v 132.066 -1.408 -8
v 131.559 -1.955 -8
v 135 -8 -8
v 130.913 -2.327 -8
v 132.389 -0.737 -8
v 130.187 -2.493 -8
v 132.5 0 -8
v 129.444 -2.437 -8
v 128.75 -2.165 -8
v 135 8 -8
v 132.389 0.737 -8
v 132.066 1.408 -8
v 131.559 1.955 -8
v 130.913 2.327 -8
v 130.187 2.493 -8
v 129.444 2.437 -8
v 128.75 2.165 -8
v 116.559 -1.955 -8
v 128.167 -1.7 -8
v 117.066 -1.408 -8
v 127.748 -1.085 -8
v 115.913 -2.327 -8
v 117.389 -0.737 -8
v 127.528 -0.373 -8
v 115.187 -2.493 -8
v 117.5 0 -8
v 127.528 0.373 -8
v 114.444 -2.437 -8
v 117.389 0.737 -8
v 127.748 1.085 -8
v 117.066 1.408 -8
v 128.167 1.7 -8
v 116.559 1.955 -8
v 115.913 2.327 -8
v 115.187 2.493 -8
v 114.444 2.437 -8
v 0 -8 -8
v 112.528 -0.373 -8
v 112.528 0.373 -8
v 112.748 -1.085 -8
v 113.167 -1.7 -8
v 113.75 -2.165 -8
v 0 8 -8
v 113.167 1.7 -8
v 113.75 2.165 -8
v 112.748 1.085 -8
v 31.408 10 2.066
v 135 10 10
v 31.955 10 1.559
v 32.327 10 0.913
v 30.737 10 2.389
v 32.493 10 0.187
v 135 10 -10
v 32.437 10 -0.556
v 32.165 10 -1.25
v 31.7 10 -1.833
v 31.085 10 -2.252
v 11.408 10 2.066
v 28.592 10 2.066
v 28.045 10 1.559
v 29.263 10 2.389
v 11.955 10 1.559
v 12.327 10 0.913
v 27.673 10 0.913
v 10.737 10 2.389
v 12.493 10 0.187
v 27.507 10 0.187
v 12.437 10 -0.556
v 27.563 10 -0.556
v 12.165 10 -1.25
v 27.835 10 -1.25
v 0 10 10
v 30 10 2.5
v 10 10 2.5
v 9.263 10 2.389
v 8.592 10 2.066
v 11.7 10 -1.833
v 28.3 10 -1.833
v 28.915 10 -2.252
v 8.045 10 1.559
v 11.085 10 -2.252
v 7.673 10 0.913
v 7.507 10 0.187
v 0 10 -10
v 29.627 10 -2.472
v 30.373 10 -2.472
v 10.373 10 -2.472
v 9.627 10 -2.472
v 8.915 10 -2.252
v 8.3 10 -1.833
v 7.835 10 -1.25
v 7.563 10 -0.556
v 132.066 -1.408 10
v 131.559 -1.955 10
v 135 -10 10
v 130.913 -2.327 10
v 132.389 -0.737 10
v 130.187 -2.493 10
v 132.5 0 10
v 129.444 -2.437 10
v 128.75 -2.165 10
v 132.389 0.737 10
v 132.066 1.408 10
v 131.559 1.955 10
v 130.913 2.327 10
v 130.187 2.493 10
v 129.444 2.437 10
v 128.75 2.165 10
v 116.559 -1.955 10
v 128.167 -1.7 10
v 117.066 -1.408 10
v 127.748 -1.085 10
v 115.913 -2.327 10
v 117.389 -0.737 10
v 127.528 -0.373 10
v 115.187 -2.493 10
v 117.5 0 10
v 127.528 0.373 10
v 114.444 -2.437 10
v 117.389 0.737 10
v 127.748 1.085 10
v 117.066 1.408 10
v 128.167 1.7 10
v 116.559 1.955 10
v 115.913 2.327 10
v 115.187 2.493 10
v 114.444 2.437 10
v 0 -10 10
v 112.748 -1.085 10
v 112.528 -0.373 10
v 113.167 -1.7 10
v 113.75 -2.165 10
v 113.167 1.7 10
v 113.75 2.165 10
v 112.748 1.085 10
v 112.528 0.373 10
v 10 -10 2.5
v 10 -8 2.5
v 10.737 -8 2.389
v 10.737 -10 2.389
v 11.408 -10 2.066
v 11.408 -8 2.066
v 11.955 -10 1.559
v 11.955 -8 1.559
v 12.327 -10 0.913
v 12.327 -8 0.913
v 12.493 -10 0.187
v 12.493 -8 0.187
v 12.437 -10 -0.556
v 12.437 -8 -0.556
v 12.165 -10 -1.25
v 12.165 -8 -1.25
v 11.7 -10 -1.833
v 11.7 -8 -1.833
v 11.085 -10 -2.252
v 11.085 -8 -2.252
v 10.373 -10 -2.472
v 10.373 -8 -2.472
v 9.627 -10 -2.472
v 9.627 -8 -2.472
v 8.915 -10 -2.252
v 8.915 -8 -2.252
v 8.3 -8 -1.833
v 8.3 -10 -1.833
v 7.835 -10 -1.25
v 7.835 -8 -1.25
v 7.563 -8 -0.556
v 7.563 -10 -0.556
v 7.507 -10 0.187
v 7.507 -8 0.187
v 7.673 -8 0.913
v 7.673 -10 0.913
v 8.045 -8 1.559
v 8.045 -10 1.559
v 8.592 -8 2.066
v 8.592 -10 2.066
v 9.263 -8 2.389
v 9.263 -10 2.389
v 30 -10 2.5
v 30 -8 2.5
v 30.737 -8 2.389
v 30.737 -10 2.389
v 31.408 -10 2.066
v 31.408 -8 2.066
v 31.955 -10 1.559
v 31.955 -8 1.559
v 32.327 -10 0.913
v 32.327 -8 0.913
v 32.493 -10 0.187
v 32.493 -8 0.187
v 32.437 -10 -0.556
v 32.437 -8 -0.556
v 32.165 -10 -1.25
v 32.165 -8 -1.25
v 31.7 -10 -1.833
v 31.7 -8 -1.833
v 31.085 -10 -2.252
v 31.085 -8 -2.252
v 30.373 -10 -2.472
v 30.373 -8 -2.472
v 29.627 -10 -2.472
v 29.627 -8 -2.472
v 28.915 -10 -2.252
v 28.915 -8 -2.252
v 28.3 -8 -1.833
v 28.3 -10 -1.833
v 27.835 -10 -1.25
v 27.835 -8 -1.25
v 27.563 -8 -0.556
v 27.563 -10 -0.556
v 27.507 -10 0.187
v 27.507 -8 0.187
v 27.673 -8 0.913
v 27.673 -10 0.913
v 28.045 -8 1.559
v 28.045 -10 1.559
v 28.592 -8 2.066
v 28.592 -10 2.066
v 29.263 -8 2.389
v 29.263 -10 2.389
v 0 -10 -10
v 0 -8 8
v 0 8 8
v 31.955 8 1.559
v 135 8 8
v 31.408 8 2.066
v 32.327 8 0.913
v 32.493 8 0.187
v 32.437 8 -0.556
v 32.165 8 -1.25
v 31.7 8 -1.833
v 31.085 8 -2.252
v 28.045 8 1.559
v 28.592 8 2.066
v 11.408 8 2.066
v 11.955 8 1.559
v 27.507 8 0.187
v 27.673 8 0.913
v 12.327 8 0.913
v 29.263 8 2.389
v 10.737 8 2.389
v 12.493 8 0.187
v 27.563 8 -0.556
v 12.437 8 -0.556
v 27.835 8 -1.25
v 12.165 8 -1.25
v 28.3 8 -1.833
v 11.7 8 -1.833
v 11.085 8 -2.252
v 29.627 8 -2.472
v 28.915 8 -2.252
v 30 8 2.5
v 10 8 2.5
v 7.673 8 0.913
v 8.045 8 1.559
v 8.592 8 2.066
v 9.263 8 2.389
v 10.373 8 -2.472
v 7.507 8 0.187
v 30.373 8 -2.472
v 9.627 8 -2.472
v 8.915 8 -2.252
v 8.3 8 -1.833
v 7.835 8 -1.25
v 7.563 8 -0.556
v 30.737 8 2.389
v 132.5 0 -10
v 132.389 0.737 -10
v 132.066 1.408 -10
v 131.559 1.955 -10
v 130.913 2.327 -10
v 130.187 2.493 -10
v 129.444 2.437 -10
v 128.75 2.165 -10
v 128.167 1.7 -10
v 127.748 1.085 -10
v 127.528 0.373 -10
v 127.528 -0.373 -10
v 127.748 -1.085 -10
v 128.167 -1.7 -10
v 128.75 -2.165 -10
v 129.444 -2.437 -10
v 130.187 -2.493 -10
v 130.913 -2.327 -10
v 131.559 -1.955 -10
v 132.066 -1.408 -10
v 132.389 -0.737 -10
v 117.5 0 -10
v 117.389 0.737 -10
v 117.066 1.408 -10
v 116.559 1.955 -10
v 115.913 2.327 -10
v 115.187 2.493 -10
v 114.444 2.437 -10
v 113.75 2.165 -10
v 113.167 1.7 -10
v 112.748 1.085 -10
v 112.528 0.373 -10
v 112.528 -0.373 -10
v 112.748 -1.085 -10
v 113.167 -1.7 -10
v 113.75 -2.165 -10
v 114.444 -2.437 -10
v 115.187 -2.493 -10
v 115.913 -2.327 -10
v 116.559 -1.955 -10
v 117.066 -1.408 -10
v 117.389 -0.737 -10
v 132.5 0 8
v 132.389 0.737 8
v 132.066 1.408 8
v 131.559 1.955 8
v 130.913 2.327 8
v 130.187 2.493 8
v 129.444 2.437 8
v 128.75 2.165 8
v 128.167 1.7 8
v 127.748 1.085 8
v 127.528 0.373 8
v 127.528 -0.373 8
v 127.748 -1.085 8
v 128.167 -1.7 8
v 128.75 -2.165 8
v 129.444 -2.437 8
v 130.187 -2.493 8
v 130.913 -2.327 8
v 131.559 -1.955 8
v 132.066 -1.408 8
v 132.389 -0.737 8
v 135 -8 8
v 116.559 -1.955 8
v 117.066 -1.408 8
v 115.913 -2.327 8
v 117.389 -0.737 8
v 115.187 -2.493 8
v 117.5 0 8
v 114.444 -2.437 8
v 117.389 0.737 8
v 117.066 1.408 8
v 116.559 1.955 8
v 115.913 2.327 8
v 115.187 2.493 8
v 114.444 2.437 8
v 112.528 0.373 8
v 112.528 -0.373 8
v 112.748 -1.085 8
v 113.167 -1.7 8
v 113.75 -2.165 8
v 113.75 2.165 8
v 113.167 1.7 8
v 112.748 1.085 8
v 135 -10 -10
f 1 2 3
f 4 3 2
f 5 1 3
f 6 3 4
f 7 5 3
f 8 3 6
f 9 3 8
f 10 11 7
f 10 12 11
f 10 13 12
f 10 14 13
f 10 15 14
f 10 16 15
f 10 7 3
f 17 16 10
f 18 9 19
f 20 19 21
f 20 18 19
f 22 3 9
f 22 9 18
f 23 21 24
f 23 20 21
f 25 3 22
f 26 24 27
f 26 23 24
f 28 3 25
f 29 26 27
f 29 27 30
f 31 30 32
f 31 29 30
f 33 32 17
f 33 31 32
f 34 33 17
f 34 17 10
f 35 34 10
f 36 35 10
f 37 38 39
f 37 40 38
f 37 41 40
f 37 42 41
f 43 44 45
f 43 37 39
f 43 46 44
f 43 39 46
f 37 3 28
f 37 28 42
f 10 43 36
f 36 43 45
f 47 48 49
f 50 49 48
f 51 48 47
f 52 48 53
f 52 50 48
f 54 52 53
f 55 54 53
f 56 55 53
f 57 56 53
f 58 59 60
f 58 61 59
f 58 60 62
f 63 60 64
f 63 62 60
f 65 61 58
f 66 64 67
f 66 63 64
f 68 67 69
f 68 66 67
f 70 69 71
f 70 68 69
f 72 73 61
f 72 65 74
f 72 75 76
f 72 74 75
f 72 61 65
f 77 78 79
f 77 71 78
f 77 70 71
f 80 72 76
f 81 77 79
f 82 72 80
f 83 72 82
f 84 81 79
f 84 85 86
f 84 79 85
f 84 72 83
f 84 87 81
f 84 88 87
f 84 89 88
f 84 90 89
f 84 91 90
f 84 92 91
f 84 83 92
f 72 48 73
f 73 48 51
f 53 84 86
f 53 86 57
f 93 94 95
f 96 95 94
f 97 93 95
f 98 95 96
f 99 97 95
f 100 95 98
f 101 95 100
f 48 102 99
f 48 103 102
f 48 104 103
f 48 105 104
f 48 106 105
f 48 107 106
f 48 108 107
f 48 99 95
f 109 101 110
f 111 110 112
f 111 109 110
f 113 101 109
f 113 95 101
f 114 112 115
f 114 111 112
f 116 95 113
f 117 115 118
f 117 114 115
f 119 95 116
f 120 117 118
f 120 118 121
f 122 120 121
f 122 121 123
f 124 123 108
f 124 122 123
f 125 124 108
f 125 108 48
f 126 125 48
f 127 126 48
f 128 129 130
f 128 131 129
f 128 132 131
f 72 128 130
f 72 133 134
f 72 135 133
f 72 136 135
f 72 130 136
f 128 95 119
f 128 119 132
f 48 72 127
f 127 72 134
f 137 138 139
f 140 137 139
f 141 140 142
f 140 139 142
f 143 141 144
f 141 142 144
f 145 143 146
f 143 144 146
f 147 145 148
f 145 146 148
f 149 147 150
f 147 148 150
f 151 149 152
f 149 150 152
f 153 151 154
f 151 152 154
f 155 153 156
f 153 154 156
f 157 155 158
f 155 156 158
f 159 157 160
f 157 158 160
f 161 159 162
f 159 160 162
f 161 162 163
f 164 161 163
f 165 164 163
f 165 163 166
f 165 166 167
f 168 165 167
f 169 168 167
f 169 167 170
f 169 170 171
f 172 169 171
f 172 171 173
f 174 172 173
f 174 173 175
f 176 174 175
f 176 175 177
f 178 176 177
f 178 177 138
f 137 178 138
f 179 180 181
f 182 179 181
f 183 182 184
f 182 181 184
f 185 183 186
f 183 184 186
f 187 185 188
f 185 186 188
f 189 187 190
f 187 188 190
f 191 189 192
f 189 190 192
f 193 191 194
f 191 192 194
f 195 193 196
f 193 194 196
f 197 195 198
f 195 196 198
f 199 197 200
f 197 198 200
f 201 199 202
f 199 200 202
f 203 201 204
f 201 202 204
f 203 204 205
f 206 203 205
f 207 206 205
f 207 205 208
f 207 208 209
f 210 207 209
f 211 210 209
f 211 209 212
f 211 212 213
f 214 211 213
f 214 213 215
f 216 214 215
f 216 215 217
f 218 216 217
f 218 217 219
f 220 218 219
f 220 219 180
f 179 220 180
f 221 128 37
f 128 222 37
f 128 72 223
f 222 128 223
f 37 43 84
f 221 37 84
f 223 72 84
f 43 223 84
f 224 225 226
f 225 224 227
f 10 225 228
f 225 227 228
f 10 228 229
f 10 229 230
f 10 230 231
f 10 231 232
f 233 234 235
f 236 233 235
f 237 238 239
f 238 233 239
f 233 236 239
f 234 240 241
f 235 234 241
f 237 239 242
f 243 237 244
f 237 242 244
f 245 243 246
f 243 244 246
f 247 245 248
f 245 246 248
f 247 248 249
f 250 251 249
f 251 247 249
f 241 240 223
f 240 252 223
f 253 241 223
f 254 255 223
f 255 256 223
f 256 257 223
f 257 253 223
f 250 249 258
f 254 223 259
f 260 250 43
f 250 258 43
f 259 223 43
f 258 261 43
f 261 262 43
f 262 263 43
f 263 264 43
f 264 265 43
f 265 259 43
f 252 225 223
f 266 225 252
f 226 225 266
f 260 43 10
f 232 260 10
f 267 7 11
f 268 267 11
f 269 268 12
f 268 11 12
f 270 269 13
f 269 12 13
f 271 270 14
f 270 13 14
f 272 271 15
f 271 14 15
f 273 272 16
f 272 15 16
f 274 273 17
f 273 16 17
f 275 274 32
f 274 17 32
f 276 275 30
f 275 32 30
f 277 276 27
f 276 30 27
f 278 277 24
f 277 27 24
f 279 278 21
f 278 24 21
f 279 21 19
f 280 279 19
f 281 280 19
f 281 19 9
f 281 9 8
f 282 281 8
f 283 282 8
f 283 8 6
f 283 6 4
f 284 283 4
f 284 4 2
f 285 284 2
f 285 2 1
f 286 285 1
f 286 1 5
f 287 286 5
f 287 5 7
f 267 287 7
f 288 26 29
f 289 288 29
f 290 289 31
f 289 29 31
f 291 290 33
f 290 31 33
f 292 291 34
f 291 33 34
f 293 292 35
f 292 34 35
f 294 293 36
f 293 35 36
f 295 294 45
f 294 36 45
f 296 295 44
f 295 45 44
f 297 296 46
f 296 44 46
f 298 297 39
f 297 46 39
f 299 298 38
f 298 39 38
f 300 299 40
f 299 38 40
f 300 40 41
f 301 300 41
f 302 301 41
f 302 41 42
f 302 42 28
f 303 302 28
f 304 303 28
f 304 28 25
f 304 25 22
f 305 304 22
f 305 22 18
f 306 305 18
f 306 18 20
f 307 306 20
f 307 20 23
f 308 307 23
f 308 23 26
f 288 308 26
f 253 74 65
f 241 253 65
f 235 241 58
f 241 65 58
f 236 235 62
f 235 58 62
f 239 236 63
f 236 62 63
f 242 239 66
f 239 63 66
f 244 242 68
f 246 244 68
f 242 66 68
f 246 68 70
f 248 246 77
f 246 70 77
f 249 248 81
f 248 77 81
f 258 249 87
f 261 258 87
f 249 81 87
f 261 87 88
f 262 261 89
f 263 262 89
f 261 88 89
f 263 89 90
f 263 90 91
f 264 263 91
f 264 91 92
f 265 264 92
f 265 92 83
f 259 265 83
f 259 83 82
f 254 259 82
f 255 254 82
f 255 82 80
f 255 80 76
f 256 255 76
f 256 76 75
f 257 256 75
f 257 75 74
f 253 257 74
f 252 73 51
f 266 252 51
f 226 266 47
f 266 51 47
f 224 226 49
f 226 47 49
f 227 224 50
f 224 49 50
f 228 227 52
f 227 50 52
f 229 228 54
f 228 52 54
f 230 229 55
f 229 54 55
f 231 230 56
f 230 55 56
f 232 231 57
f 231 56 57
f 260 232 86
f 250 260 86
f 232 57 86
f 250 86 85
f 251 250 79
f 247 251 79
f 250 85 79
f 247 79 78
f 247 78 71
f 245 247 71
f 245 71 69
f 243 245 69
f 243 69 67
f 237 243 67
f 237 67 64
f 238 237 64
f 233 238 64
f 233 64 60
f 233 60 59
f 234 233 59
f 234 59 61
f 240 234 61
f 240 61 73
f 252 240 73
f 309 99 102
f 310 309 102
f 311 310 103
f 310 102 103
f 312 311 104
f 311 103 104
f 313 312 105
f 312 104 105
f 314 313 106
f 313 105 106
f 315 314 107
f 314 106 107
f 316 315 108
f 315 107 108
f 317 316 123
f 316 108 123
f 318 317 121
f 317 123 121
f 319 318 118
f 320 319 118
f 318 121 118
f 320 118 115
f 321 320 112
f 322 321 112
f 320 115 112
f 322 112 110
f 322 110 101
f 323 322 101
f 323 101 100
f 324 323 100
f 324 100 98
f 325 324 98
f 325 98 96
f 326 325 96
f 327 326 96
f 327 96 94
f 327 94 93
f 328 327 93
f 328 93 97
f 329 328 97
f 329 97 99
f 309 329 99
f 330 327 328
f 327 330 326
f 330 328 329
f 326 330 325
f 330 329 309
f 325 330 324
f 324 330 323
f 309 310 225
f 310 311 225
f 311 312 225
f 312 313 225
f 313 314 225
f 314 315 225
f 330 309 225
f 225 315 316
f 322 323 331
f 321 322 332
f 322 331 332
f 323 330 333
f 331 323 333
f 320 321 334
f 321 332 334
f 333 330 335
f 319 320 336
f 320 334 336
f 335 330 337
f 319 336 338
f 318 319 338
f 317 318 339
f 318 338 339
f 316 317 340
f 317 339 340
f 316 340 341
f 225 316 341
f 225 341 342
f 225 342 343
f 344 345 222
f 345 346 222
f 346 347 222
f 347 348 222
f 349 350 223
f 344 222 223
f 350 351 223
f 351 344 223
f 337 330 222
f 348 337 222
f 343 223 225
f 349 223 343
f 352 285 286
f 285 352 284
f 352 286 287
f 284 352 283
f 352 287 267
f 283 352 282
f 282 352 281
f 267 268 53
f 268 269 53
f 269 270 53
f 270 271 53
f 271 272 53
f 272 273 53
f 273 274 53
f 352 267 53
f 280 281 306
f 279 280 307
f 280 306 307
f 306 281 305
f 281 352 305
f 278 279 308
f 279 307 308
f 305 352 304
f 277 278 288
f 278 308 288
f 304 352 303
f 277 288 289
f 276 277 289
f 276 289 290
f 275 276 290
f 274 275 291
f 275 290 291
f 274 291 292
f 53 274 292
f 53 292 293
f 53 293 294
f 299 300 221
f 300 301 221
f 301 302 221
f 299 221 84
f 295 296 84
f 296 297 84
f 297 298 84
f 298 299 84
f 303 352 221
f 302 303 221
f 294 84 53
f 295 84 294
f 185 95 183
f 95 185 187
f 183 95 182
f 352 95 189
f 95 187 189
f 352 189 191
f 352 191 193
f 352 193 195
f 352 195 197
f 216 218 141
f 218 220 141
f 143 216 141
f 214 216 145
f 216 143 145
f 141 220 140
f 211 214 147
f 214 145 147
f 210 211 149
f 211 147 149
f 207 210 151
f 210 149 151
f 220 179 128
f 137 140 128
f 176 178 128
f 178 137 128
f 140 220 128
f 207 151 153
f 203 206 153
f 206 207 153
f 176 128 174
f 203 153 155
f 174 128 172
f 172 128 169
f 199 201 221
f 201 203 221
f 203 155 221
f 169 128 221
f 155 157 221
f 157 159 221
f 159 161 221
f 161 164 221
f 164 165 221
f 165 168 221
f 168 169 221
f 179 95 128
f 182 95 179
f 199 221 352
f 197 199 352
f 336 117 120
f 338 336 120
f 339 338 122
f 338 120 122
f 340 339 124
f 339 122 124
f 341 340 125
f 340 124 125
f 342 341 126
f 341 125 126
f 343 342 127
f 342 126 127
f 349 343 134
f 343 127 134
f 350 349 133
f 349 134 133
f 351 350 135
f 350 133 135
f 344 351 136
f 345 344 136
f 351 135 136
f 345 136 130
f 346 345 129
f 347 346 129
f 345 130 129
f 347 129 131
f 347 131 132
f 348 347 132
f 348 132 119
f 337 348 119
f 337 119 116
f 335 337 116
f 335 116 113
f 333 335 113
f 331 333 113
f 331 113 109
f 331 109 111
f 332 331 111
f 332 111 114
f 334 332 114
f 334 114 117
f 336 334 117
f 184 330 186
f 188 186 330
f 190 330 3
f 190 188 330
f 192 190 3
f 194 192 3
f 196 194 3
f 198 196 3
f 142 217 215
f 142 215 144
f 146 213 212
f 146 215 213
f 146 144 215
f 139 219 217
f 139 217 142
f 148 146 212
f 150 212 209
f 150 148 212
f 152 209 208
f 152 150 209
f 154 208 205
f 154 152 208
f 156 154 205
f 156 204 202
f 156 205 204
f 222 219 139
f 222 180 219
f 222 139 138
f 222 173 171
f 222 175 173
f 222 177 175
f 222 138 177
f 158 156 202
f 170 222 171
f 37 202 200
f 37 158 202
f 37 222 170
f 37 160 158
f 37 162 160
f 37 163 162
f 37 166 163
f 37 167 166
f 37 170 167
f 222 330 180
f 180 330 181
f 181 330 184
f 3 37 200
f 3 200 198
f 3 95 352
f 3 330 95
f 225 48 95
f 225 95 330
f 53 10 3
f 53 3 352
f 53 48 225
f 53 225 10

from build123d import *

# Parameters (mm, degrees)
SKETCH1_W           = 20
SKETCH1_H           = 20
SKETCH1_W_2         = 16
SKETCH1_H_2         = 16
BOSS_EXTRUDE1_DEPTH = 135
SKETCH2_R           = 2.5
CUT_EXTRUDE1_DEPTH  = 137.839321834
SKETCH3_R           = 2.5
CUT_EXTRUDE2_DEPTH  = 137.839321834


with BuildPart() as part:
    # Sketch1 → Boss-Extrude1 (new body)
    with BuildSketch(Plane(origin=(0, 0, 0), x_dir=(0, 0, -1), z_dir=(1, 0, 0))):
        Rectangle(SKETCH1_W, SKETCH1_H)
        Rectangle(SKETCH1_W_2, SKETCH1_H_2, mode=Mode.SUBTRACT)
    extrude(amount=BOSS_EXTRUDE1_DEPTH)

    # Sketch2 → Cut-Extrude1 (cut, through all)
    with BuildSketch(Plane.XY.offset(10)):
        with Locations((130, 0)):
            Circle(SKETCH2_R)
        with Locations((115, 0)):
            Circle(SKETCH2_R)
    extrude(amount=-CUT_EXTRUDE1_DEPTH, mode=Mode.SUBTRACT)

    # Sketch3 → Cut-Extrude2 (cut, through all)
    with BuildSketch(Plane(origin=(0, 10, 0), x_dir=(1, 0, 0), z_dir=(0, 1, 0))):
        with Locations(Location((10, 0, 0), (0, 0, 270))):
            Circle(SKETCH3_R)
        with Locations(Location((30, 0, 0), (0, 0, 270))):
            Circle(SKETCH3_R)
    extrude(amount=-CUT_EXTRUDE2_DEPTH, mode=Mode.SUBTRACT)


solid = part.part
